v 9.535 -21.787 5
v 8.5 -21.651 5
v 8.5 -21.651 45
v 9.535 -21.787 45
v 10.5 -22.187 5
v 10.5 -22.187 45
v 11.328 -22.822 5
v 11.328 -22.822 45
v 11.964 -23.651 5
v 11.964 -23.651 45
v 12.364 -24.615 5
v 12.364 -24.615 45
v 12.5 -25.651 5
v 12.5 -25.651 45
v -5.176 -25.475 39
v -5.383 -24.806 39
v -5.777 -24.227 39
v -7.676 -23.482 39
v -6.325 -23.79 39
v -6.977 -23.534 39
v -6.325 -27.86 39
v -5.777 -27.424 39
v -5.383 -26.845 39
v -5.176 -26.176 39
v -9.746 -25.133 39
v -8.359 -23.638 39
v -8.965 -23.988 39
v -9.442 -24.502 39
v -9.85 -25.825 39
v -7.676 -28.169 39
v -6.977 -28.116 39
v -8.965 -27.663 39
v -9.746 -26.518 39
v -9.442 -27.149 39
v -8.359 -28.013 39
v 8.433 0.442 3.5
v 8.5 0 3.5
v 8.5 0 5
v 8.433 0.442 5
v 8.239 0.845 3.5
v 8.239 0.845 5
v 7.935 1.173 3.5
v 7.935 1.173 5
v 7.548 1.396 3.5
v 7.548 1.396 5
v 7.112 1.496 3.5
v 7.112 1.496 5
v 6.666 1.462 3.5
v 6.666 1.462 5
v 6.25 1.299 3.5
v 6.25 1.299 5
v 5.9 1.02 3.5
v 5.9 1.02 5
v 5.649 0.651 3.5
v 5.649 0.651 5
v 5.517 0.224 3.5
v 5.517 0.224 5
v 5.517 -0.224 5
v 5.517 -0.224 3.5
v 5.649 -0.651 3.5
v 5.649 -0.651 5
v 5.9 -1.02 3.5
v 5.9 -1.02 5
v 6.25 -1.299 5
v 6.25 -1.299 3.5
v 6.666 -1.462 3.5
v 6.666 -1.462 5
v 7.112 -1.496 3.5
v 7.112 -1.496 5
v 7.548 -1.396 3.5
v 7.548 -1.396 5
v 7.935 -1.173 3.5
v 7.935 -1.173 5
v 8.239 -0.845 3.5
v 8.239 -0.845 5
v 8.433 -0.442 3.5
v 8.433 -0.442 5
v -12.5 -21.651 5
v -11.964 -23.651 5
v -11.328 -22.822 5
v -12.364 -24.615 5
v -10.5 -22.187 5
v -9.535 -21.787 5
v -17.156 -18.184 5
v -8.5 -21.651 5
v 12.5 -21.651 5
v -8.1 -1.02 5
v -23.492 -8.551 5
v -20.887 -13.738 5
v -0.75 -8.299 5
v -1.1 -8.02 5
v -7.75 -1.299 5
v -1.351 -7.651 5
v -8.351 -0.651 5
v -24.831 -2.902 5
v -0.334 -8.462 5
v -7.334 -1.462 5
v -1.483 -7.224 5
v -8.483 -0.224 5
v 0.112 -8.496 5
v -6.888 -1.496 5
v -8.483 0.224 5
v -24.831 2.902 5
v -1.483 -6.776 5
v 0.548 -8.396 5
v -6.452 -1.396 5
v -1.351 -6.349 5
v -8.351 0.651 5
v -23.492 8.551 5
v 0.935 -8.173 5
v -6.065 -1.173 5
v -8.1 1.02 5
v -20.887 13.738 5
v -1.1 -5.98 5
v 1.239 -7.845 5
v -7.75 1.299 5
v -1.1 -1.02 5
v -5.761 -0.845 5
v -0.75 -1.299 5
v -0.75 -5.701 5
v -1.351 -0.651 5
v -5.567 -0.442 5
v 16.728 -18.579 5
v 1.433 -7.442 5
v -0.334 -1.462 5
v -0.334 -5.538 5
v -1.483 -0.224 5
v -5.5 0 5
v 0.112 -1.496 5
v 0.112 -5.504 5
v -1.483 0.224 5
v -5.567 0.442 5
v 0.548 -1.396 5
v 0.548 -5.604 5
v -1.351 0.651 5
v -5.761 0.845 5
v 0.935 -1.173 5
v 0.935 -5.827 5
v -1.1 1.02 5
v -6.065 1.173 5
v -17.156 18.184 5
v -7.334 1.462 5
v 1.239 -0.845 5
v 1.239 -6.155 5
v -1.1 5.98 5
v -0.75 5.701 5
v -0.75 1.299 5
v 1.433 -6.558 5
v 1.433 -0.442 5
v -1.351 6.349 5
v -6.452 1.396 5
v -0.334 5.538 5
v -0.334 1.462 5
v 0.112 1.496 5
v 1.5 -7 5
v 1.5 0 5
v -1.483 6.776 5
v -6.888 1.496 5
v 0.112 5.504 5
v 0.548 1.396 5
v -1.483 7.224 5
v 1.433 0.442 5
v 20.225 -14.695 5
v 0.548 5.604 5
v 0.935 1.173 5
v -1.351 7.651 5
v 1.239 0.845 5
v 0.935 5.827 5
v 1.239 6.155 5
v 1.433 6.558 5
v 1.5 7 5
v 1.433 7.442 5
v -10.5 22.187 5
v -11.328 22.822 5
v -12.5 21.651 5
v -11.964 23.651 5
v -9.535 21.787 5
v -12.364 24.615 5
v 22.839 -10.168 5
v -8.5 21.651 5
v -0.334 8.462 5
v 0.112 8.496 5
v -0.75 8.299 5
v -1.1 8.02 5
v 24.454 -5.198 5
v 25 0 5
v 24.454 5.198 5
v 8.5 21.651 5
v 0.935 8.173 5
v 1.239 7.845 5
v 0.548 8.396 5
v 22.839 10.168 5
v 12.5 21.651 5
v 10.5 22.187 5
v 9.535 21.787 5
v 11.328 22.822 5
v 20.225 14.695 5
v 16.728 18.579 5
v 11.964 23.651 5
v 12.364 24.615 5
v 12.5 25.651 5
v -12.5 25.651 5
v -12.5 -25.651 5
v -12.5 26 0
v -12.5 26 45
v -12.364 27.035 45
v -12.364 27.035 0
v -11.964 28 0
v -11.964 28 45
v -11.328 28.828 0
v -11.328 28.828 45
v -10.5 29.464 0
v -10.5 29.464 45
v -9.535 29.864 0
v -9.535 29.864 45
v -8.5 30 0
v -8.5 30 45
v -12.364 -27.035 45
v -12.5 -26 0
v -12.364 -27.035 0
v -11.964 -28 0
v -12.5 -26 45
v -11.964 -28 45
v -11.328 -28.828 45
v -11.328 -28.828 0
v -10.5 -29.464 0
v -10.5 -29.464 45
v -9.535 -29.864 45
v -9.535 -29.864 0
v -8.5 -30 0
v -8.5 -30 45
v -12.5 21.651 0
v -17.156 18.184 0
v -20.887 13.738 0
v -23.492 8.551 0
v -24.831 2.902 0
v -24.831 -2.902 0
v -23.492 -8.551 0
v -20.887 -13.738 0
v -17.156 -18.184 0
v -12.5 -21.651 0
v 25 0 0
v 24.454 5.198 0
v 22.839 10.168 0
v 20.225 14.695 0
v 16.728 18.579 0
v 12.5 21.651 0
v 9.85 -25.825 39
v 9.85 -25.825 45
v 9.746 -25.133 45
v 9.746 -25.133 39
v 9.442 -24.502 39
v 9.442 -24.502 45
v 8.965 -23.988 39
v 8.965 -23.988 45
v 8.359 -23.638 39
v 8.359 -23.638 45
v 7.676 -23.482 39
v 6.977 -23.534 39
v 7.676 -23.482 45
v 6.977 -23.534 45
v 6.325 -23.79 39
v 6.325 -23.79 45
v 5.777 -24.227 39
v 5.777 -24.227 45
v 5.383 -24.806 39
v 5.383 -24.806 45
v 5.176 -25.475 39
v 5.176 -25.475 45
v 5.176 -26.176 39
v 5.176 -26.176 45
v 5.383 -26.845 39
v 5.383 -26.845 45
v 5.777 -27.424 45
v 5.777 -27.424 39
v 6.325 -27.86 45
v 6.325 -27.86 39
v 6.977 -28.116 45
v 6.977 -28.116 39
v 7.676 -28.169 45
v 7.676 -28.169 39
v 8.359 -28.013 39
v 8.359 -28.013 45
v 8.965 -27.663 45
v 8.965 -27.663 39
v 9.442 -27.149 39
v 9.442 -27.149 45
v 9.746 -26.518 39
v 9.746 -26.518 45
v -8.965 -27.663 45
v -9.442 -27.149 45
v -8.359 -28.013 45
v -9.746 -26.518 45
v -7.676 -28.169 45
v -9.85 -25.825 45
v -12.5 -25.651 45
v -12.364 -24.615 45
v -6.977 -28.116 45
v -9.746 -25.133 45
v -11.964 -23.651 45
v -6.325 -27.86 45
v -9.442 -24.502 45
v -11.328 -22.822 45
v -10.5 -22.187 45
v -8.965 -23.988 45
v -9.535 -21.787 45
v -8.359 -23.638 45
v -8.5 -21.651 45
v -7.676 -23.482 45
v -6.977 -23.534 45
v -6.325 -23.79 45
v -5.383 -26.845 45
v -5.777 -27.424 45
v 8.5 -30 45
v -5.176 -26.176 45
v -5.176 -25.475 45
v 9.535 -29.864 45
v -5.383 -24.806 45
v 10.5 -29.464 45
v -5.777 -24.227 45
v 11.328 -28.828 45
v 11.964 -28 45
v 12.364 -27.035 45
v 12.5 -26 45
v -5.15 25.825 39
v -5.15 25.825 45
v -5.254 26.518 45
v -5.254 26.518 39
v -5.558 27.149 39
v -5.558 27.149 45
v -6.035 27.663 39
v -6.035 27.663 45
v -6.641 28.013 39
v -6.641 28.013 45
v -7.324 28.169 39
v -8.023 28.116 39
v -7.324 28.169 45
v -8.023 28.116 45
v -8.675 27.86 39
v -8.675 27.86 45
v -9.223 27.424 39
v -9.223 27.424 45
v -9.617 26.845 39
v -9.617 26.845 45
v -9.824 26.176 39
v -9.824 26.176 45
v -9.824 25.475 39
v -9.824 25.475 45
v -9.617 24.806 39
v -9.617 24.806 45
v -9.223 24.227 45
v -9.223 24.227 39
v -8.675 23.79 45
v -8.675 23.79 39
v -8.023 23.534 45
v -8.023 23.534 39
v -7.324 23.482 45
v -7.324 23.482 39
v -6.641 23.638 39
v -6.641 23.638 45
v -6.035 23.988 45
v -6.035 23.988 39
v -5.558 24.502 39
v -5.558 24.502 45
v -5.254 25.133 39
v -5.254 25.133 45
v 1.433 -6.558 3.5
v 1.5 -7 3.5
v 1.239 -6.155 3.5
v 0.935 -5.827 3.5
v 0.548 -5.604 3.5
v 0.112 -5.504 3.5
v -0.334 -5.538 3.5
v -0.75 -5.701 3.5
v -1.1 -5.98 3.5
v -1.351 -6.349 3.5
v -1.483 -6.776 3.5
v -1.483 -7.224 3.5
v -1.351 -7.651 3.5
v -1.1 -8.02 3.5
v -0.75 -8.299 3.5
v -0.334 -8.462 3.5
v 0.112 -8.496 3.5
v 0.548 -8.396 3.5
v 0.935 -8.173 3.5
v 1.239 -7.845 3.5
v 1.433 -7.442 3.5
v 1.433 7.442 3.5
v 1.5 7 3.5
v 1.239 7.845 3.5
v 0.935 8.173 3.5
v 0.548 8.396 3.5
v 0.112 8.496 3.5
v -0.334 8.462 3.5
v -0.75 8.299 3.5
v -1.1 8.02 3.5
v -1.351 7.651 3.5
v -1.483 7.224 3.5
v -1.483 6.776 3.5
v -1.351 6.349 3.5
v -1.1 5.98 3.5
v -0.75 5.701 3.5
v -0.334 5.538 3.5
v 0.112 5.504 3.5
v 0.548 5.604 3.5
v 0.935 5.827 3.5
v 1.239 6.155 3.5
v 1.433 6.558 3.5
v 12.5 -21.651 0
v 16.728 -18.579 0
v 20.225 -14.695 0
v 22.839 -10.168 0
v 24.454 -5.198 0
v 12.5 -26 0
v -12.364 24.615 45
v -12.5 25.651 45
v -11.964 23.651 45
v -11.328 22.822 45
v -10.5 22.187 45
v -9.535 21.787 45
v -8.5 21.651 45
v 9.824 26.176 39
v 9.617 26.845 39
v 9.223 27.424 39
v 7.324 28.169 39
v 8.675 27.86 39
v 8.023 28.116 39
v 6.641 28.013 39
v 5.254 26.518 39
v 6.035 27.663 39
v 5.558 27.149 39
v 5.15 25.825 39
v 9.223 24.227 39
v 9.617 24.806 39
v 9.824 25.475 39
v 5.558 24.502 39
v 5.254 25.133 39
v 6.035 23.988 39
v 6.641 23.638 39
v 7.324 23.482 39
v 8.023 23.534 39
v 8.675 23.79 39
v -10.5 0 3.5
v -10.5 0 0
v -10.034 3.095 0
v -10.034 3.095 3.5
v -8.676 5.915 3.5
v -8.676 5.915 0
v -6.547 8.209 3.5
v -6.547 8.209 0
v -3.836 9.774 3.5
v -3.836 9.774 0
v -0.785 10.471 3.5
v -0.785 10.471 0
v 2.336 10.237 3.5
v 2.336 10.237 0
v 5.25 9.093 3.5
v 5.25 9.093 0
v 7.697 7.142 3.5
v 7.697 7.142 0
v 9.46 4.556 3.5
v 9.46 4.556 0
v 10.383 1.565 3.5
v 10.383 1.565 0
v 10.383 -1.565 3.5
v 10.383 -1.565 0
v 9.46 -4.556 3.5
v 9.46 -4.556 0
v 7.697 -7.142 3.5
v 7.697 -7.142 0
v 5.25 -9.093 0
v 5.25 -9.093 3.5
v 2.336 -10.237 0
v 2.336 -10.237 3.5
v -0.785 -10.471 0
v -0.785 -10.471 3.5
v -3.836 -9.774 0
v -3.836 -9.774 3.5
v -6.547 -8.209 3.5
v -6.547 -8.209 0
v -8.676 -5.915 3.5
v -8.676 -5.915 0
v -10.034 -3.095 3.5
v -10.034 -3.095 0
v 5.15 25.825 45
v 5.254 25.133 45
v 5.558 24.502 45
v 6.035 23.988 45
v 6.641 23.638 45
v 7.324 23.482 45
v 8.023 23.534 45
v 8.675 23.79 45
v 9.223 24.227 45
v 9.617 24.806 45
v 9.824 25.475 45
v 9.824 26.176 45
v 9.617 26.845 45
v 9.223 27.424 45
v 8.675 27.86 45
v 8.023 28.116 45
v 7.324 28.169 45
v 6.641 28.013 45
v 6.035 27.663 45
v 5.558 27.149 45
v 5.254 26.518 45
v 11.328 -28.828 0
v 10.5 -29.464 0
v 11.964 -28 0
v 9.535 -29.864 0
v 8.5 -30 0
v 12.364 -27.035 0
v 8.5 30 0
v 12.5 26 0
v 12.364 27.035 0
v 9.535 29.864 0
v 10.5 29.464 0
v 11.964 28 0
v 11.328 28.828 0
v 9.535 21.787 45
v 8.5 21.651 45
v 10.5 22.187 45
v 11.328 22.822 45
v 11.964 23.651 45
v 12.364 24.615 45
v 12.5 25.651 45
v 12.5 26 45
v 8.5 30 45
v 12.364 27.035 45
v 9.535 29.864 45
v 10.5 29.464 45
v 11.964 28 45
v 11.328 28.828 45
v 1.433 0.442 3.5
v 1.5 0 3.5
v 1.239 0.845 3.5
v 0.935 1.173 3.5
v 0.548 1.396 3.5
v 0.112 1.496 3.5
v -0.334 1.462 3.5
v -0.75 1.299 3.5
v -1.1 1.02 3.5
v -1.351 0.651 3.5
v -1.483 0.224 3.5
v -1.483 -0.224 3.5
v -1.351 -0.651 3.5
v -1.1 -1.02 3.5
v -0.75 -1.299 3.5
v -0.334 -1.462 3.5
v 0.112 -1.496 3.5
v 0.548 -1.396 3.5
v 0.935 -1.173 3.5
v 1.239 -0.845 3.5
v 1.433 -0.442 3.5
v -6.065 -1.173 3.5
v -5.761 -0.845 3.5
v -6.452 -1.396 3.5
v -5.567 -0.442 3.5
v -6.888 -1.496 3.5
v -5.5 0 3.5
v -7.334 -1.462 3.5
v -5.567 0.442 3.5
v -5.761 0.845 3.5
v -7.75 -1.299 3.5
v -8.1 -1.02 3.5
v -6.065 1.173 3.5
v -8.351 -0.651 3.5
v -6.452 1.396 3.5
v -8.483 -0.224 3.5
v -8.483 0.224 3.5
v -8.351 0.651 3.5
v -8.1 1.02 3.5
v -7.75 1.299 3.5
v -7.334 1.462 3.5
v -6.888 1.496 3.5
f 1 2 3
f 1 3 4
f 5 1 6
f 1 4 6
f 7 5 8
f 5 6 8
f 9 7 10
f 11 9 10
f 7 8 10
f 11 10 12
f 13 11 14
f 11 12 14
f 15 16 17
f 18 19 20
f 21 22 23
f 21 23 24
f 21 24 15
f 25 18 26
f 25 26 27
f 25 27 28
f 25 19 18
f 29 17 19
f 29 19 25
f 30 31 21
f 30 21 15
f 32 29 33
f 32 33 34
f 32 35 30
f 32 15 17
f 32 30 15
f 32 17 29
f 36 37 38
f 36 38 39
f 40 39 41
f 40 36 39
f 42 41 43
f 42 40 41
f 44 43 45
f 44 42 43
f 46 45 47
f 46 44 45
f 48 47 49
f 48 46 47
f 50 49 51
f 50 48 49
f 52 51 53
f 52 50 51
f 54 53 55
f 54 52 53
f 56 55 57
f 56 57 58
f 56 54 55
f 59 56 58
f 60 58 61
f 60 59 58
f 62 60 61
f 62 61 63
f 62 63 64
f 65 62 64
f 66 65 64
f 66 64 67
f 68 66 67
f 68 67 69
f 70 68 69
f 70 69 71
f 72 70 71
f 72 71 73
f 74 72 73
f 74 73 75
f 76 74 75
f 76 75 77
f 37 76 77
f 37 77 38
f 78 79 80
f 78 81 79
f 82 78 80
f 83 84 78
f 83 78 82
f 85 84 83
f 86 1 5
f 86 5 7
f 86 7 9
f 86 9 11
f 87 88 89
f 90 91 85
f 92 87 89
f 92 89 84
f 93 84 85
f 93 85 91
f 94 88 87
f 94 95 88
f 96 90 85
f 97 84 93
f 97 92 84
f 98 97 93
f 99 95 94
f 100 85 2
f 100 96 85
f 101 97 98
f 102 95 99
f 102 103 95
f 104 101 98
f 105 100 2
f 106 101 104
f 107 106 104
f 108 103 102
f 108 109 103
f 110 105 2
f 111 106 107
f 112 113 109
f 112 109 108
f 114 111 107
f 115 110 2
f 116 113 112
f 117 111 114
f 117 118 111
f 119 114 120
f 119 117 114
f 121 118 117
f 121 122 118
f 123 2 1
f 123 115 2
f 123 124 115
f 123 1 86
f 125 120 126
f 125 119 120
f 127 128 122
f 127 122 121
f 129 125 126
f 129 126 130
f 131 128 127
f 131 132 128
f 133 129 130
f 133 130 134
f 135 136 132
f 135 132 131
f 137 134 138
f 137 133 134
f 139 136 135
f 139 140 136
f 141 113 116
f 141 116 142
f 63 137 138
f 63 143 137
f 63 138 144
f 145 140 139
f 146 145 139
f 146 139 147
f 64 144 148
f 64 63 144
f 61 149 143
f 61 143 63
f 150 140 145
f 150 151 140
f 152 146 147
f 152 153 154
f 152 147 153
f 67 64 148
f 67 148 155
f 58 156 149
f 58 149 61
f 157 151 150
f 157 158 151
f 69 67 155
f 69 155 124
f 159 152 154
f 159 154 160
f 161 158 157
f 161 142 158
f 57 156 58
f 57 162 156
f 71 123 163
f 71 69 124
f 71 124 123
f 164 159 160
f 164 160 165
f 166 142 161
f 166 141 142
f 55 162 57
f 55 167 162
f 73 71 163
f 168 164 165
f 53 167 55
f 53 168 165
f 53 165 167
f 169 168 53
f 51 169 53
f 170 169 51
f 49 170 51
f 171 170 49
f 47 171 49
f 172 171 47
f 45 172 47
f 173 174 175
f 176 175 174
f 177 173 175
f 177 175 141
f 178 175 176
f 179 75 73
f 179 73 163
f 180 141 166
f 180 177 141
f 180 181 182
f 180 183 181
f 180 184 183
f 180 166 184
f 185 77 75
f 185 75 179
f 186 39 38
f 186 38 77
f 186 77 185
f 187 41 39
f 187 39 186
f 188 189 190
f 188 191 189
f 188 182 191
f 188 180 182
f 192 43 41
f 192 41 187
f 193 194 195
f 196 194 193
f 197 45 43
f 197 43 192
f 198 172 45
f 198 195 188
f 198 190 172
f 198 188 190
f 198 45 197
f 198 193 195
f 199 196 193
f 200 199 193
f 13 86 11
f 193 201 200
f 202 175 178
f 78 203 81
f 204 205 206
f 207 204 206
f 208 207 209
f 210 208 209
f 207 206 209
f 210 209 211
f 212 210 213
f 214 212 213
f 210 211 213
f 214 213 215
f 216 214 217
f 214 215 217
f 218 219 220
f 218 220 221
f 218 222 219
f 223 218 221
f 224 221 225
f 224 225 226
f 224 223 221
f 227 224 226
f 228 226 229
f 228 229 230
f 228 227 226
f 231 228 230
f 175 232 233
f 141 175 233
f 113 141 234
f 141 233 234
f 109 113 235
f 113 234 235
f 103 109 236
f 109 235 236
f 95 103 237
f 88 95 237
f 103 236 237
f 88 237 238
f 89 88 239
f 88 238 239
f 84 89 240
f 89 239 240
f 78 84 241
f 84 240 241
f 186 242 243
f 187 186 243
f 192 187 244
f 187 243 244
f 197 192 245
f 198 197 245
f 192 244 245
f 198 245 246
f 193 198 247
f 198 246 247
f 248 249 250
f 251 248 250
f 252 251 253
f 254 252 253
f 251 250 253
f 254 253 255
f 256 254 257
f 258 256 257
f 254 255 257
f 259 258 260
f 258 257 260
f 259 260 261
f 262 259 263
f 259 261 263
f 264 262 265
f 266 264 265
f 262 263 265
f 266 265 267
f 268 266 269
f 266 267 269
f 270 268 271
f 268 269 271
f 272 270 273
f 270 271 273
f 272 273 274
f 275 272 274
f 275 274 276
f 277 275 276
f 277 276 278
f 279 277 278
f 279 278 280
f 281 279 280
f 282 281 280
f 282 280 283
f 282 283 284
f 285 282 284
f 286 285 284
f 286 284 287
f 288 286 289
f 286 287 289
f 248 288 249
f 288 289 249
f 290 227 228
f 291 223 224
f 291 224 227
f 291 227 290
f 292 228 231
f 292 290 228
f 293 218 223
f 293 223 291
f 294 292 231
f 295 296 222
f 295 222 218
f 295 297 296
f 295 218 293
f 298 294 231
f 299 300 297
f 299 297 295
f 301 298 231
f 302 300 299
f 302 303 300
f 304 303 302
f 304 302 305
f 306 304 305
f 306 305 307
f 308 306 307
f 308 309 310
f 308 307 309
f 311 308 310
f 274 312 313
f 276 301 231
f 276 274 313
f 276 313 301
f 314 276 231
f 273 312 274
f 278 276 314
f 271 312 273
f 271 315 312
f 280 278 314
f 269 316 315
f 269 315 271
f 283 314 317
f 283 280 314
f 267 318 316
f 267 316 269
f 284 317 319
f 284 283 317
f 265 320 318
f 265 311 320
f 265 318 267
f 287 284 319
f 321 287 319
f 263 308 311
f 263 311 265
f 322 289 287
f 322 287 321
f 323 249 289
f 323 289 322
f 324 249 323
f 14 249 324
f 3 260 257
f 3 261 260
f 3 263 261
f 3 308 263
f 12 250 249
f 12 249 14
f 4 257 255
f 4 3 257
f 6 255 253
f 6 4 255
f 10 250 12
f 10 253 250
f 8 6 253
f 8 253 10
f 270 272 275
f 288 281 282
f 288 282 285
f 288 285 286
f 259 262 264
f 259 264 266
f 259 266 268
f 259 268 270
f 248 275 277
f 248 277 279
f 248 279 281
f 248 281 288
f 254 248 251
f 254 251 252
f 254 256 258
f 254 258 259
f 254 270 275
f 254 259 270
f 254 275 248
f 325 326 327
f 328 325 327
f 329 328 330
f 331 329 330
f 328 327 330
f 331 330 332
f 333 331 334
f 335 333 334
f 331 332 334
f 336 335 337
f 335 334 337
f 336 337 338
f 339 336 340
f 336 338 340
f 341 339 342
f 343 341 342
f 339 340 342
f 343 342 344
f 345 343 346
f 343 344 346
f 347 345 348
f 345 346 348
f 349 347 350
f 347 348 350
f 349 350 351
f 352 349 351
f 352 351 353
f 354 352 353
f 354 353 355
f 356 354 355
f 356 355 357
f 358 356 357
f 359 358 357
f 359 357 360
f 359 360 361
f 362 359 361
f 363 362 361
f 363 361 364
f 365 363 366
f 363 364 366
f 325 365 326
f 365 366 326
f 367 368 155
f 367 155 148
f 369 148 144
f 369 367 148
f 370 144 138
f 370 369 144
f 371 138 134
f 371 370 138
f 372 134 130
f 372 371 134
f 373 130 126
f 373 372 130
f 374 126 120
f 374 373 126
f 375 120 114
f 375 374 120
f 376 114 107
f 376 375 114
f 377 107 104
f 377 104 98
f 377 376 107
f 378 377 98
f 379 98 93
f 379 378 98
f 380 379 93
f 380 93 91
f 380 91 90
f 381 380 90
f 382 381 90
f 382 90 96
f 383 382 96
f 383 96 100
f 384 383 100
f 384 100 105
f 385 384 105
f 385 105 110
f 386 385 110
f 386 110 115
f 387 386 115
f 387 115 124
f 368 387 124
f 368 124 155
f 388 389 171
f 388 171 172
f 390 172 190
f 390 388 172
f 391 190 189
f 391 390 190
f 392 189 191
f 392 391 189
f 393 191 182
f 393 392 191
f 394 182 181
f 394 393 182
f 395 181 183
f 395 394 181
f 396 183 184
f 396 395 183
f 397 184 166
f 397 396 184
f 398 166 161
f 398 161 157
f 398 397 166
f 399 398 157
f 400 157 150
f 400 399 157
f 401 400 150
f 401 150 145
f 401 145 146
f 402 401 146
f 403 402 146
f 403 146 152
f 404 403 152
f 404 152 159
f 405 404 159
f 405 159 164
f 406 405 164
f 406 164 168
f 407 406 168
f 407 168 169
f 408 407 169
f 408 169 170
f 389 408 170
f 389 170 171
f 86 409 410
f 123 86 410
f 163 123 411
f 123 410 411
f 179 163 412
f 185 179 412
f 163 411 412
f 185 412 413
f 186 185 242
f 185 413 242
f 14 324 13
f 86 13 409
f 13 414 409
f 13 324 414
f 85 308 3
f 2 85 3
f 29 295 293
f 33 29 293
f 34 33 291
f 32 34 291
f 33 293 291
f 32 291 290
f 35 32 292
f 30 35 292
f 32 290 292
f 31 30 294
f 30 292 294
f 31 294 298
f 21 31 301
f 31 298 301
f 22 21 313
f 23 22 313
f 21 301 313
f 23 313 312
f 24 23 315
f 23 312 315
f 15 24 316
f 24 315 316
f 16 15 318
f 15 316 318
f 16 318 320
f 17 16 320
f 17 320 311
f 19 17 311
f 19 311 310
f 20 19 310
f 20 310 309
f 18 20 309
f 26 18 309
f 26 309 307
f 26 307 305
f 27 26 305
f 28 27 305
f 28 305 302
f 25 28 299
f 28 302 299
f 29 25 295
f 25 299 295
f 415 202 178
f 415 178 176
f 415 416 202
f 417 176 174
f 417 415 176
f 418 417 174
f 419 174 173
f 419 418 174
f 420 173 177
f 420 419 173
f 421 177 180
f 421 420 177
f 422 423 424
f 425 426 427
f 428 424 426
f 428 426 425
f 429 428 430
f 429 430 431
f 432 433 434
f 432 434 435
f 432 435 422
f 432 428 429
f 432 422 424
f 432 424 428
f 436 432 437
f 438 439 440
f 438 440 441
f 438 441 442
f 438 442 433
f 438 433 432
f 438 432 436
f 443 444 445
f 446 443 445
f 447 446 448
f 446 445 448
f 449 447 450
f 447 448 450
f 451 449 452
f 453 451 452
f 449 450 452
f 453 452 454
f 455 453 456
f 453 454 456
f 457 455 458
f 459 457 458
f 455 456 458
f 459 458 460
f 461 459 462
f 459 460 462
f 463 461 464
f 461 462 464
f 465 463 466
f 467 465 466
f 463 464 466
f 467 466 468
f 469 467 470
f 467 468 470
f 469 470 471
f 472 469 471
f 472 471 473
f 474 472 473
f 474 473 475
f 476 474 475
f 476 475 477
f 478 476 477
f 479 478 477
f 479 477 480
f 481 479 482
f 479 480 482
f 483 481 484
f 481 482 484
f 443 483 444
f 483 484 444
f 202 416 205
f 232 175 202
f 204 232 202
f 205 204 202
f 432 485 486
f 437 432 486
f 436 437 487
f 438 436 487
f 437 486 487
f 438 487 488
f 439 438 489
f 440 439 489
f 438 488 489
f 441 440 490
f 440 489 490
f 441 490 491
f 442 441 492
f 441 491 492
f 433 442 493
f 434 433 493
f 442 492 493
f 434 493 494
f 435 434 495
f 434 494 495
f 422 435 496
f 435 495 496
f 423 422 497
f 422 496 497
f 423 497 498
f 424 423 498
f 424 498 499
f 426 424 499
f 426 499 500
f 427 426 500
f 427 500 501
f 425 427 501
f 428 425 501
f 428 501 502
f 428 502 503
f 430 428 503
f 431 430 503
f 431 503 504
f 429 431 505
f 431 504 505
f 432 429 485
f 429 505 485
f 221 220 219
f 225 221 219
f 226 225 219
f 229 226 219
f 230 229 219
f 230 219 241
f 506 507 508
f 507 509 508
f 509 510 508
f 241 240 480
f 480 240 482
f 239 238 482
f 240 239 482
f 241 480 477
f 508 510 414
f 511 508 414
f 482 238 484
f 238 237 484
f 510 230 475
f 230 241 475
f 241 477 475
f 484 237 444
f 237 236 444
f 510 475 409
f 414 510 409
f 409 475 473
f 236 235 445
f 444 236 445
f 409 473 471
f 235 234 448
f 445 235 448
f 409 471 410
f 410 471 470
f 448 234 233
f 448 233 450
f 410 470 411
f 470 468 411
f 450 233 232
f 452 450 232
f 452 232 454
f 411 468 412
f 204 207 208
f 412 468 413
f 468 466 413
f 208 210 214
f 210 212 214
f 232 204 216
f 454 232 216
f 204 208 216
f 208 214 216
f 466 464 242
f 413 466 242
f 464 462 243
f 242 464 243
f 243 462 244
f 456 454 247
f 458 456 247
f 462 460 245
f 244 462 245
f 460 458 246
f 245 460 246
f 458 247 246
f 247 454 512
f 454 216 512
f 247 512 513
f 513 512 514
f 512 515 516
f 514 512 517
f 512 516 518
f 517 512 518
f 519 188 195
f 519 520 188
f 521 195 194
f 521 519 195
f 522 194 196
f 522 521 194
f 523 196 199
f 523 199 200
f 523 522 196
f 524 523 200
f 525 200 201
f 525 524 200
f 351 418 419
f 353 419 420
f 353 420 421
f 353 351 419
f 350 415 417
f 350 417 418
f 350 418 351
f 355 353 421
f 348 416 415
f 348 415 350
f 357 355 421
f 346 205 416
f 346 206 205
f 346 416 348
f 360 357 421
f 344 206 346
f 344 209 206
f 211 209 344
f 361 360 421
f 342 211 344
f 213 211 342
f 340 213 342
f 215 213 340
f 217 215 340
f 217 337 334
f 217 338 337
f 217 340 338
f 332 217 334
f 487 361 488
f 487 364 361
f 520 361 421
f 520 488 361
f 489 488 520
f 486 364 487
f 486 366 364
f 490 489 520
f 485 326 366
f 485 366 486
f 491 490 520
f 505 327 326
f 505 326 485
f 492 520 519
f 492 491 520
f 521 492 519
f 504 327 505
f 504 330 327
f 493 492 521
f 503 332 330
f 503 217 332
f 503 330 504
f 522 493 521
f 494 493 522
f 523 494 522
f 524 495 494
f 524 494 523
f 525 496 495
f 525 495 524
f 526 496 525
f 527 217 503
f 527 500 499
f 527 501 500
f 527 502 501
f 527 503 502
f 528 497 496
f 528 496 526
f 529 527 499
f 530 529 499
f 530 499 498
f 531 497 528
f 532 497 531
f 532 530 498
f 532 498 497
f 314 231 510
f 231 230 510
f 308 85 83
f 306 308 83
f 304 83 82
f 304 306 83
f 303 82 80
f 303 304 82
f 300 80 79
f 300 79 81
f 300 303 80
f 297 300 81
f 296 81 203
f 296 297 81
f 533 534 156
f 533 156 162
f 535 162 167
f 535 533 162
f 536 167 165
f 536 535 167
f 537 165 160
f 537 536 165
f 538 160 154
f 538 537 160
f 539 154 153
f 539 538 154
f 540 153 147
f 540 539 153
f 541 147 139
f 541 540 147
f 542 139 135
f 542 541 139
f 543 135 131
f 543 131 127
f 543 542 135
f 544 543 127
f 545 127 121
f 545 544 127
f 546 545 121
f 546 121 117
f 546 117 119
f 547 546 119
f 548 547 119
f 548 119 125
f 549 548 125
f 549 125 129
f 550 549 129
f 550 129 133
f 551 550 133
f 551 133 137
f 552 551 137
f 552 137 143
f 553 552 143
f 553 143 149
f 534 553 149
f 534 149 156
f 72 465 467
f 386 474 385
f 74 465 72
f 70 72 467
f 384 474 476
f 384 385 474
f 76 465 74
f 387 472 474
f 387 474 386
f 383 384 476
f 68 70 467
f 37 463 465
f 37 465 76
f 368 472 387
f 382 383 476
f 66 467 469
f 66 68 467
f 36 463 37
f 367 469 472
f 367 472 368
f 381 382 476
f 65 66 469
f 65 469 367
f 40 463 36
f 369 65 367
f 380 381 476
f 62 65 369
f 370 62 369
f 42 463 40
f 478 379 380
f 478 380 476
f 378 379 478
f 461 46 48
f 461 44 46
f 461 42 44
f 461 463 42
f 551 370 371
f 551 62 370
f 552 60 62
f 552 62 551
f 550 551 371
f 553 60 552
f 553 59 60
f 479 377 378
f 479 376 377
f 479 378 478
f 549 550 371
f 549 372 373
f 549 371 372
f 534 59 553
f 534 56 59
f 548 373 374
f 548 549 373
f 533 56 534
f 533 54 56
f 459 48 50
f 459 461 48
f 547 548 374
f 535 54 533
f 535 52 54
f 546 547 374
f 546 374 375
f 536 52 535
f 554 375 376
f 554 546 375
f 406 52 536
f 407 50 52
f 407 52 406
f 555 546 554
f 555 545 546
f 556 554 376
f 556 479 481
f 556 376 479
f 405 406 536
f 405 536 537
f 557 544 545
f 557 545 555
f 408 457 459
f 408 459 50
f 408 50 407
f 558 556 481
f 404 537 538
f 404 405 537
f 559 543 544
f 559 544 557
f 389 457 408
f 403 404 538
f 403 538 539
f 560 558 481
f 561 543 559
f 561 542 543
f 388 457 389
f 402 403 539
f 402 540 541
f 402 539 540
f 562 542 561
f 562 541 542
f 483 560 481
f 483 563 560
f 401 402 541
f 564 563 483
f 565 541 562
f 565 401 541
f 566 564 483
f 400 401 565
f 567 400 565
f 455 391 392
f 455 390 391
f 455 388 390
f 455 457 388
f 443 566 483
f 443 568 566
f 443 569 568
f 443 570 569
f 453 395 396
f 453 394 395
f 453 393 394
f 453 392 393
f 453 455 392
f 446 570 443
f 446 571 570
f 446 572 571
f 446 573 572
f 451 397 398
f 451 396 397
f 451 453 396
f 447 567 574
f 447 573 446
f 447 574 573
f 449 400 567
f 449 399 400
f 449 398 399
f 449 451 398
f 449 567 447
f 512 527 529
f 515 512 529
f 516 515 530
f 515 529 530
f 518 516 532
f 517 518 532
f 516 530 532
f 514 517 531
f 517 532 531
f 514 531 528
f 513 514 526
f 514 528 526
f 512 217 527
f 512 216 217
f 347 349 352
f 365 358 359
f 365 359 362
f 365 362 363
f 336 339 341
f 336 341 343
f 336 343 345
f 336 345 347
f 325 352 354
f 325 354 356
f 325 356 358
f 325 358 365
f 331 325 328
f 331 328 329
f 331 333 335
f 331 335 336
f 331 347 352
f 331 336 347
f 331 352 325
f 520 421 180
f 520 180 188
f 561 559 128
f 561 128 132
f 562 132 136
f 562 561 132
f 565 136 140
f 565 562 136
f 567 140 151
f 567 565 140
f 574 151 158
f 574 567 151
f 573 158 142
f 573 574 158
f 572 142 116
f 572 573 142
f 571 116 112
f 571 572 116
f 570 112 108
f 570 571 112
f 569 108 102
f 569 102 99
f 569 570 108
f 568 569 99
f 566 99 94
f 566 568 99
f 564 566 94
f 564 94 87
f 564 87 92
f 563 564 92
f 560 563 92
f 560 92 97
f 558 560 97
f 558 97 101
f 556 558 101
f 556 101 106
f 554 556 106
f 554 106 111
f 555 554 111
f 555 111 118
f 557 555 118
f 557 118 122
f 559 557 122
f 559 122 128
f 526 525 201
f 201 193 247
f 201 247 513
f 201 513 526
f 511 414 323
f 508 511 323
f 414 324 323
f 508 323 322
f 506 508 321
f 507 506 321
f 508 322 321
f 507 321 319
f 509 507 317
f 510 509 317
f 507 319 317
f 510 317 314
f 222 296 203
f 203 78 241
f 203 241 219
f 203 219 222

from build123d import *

# Parameters (mm, degrees)
SKETCH1_R           = 1.5
BOSS_EXTRUDE1_DEPTH = 5
SKETCH3_R           = 10.5
CUT_EXTRUDE2_DEPTH  = 3.5
SKETCH4_W           = 25
SKETCH4_H           = 8.349364905
BOSS_EXTRUDE2_DEPTH = 40
FILLET1_R           = 4
SKETCH5_R           = 2.35
CUT_EXTRUDE3_DEPTH  = 6


with BuildPart() as part:
    # Sketch1 → Boss-Extrude1 (new body)
    # profile 1 of 5: a face of its own
    with BuildSketch(Plane.XY):
        with BuildLine():
            ThreePointArc((-12.5, 21.650635095), (-25, 0), (-12.5, -21.650635095))
            Line((-12.5, -21.650635095), (-12.5, 21.650635095))
        make_face()
    # profile 2 of 5: a face of its own
    with BuildSketch(Plane.XY):
        with BuildLine():
            Line((-12.5, 21.650635095), (-12.5, -21.650635095))
            ThreePointArc((-12.5, -21.650635095), (0, -25), (12.5, -21.650635095))
            Line((12.5, -21.650635095), (12.5, 21.650635095))
            ThreePointArc((12.5, 21.650635095), (0, 25), (-12.5, 21.650635095))
        make_face()
        with Locations((0, -7)):
            Circle(SKETCH1_R, mode=Mode.SUBTRACT)
        with Locations((7, 0)):
            Circle(SKETCH1_R, mode=Mode.SUBTRACT)
        with Locations((-7, 0)):
            Circle(SKETCH1_R, mode=Mode.SUBTRACT)
        Circle(SKETCH1_R, mode=Mode.SUBTRACT)
        with Locations((0, 7)):
            Circle(SKETCH1_R, mode=Mode.SUBTRACT)
    # profile 3 of 5: a face of its own
    with BuildSketch(Plane.XY):
        with BuildLine():
            Line((-12.5, 30), (-12.5, 21.650635095))
            ThreePointArc((-12.5, 21.650635095), (0, 25), (12.5, 21.650635095))
            Line((12.5, 21.650635095), (12.5, 30))
            Line((12.5, 30), (-12.5, 30))
        make_face()
    # profile 4 of 5: a face of its own
    with BuildSketch(Plane.XY):
        with BuildLine():
            Line((-12.5, -21.650635095), (-12.5, -30))
            Line((-12.5, -30), (12.5, -30))
            Line((12.5, -30), (12.5, -21.650635095))
            ThreePointArc((12.5, -21.650635095), (0, -25), (-12.5, -21.650635095))
        make_face()
    # profile 5 of 5: a face of its own
    with BuildSketch(Plane.XY):
        with BuildLine():
            Line((12.5, 21.650635095), (12.5, -21.650635095))
            ThreePointArc((12.5, -21.650635095), (21.650635095, -12.5), (25, 0))
            ThreePointArc((25, 0), (21.650635095, 12.5), (12.5, 21.650635095))
        make_face()
    extrude(amount=BOSS_EXTRUDE1_DEPTH)

    # Sketch3 → Cut-Extrude2 (cut)
    with BuildSketch(Plane(origin=(0, 0, 0), x_dir=(-1, 0, 0), z_dir=(0, 0, -1))):
        Circle(SKETCH3_R)
    extrude(amount=-CUT_EXTRUDE2_DEPTH, mode=Mode.SUBTRACT)

    # Sketch4 → Boss-Extrude2 (add)
    with BuildSketch(Plane.XY.offset(5)):
        with Locations((0, 25.825317548)):
            Rectangle(SKETCH4_W, SKETCH4_H)
        with Locations((0, -25.825317548)):
            Rectangle(SKETCH4_W, SKETCH4_H)
    extrude(amount=BOSS_EXTRUDE2_DEPTH)

    # Fillet1
    fillet1_edges = [part.edges().sort_by_distance(p)[0] for p in [
        (-12.5, 30, 22.5),
        (12.5, 30, 22.5),
        (12.5, -30, 22.5),
        (-12.5, -30, 22.5),
        (-12.5, 21.650635095, 25),
        (12.5, 21.650635095, 25),
        (-12.5, -21.650635095, 25),
        (12.5, -21.650635095, 25),
    ]]
    fillet(fillet1_edges, radius=FILLET1_R)

    # Sketch5 → Cut-Extrude3 (cut)
    with BuildSketch(Plane.XY.offset(45)):
        with Locations((-7.5, 25.825317547)):
            Circle(SKETCH5_R)
        with Locations(Location((7.5, 25.825317547, 0), (0, 0, 180))):
            Circle(SKETCH5_R)
        with Locations((7.5, -25.825317547)):
            Circle(SKETCH5_R)
        with Locations(Location((-7.5, -25.825317547, 0), (0, 0, 180))):
            Circle(SKETCH5_R)
    extrude(amount=-CUT_EXTRUDE3_DEPTH, mode=Mode.SUBTRACT)


solid = part.part
